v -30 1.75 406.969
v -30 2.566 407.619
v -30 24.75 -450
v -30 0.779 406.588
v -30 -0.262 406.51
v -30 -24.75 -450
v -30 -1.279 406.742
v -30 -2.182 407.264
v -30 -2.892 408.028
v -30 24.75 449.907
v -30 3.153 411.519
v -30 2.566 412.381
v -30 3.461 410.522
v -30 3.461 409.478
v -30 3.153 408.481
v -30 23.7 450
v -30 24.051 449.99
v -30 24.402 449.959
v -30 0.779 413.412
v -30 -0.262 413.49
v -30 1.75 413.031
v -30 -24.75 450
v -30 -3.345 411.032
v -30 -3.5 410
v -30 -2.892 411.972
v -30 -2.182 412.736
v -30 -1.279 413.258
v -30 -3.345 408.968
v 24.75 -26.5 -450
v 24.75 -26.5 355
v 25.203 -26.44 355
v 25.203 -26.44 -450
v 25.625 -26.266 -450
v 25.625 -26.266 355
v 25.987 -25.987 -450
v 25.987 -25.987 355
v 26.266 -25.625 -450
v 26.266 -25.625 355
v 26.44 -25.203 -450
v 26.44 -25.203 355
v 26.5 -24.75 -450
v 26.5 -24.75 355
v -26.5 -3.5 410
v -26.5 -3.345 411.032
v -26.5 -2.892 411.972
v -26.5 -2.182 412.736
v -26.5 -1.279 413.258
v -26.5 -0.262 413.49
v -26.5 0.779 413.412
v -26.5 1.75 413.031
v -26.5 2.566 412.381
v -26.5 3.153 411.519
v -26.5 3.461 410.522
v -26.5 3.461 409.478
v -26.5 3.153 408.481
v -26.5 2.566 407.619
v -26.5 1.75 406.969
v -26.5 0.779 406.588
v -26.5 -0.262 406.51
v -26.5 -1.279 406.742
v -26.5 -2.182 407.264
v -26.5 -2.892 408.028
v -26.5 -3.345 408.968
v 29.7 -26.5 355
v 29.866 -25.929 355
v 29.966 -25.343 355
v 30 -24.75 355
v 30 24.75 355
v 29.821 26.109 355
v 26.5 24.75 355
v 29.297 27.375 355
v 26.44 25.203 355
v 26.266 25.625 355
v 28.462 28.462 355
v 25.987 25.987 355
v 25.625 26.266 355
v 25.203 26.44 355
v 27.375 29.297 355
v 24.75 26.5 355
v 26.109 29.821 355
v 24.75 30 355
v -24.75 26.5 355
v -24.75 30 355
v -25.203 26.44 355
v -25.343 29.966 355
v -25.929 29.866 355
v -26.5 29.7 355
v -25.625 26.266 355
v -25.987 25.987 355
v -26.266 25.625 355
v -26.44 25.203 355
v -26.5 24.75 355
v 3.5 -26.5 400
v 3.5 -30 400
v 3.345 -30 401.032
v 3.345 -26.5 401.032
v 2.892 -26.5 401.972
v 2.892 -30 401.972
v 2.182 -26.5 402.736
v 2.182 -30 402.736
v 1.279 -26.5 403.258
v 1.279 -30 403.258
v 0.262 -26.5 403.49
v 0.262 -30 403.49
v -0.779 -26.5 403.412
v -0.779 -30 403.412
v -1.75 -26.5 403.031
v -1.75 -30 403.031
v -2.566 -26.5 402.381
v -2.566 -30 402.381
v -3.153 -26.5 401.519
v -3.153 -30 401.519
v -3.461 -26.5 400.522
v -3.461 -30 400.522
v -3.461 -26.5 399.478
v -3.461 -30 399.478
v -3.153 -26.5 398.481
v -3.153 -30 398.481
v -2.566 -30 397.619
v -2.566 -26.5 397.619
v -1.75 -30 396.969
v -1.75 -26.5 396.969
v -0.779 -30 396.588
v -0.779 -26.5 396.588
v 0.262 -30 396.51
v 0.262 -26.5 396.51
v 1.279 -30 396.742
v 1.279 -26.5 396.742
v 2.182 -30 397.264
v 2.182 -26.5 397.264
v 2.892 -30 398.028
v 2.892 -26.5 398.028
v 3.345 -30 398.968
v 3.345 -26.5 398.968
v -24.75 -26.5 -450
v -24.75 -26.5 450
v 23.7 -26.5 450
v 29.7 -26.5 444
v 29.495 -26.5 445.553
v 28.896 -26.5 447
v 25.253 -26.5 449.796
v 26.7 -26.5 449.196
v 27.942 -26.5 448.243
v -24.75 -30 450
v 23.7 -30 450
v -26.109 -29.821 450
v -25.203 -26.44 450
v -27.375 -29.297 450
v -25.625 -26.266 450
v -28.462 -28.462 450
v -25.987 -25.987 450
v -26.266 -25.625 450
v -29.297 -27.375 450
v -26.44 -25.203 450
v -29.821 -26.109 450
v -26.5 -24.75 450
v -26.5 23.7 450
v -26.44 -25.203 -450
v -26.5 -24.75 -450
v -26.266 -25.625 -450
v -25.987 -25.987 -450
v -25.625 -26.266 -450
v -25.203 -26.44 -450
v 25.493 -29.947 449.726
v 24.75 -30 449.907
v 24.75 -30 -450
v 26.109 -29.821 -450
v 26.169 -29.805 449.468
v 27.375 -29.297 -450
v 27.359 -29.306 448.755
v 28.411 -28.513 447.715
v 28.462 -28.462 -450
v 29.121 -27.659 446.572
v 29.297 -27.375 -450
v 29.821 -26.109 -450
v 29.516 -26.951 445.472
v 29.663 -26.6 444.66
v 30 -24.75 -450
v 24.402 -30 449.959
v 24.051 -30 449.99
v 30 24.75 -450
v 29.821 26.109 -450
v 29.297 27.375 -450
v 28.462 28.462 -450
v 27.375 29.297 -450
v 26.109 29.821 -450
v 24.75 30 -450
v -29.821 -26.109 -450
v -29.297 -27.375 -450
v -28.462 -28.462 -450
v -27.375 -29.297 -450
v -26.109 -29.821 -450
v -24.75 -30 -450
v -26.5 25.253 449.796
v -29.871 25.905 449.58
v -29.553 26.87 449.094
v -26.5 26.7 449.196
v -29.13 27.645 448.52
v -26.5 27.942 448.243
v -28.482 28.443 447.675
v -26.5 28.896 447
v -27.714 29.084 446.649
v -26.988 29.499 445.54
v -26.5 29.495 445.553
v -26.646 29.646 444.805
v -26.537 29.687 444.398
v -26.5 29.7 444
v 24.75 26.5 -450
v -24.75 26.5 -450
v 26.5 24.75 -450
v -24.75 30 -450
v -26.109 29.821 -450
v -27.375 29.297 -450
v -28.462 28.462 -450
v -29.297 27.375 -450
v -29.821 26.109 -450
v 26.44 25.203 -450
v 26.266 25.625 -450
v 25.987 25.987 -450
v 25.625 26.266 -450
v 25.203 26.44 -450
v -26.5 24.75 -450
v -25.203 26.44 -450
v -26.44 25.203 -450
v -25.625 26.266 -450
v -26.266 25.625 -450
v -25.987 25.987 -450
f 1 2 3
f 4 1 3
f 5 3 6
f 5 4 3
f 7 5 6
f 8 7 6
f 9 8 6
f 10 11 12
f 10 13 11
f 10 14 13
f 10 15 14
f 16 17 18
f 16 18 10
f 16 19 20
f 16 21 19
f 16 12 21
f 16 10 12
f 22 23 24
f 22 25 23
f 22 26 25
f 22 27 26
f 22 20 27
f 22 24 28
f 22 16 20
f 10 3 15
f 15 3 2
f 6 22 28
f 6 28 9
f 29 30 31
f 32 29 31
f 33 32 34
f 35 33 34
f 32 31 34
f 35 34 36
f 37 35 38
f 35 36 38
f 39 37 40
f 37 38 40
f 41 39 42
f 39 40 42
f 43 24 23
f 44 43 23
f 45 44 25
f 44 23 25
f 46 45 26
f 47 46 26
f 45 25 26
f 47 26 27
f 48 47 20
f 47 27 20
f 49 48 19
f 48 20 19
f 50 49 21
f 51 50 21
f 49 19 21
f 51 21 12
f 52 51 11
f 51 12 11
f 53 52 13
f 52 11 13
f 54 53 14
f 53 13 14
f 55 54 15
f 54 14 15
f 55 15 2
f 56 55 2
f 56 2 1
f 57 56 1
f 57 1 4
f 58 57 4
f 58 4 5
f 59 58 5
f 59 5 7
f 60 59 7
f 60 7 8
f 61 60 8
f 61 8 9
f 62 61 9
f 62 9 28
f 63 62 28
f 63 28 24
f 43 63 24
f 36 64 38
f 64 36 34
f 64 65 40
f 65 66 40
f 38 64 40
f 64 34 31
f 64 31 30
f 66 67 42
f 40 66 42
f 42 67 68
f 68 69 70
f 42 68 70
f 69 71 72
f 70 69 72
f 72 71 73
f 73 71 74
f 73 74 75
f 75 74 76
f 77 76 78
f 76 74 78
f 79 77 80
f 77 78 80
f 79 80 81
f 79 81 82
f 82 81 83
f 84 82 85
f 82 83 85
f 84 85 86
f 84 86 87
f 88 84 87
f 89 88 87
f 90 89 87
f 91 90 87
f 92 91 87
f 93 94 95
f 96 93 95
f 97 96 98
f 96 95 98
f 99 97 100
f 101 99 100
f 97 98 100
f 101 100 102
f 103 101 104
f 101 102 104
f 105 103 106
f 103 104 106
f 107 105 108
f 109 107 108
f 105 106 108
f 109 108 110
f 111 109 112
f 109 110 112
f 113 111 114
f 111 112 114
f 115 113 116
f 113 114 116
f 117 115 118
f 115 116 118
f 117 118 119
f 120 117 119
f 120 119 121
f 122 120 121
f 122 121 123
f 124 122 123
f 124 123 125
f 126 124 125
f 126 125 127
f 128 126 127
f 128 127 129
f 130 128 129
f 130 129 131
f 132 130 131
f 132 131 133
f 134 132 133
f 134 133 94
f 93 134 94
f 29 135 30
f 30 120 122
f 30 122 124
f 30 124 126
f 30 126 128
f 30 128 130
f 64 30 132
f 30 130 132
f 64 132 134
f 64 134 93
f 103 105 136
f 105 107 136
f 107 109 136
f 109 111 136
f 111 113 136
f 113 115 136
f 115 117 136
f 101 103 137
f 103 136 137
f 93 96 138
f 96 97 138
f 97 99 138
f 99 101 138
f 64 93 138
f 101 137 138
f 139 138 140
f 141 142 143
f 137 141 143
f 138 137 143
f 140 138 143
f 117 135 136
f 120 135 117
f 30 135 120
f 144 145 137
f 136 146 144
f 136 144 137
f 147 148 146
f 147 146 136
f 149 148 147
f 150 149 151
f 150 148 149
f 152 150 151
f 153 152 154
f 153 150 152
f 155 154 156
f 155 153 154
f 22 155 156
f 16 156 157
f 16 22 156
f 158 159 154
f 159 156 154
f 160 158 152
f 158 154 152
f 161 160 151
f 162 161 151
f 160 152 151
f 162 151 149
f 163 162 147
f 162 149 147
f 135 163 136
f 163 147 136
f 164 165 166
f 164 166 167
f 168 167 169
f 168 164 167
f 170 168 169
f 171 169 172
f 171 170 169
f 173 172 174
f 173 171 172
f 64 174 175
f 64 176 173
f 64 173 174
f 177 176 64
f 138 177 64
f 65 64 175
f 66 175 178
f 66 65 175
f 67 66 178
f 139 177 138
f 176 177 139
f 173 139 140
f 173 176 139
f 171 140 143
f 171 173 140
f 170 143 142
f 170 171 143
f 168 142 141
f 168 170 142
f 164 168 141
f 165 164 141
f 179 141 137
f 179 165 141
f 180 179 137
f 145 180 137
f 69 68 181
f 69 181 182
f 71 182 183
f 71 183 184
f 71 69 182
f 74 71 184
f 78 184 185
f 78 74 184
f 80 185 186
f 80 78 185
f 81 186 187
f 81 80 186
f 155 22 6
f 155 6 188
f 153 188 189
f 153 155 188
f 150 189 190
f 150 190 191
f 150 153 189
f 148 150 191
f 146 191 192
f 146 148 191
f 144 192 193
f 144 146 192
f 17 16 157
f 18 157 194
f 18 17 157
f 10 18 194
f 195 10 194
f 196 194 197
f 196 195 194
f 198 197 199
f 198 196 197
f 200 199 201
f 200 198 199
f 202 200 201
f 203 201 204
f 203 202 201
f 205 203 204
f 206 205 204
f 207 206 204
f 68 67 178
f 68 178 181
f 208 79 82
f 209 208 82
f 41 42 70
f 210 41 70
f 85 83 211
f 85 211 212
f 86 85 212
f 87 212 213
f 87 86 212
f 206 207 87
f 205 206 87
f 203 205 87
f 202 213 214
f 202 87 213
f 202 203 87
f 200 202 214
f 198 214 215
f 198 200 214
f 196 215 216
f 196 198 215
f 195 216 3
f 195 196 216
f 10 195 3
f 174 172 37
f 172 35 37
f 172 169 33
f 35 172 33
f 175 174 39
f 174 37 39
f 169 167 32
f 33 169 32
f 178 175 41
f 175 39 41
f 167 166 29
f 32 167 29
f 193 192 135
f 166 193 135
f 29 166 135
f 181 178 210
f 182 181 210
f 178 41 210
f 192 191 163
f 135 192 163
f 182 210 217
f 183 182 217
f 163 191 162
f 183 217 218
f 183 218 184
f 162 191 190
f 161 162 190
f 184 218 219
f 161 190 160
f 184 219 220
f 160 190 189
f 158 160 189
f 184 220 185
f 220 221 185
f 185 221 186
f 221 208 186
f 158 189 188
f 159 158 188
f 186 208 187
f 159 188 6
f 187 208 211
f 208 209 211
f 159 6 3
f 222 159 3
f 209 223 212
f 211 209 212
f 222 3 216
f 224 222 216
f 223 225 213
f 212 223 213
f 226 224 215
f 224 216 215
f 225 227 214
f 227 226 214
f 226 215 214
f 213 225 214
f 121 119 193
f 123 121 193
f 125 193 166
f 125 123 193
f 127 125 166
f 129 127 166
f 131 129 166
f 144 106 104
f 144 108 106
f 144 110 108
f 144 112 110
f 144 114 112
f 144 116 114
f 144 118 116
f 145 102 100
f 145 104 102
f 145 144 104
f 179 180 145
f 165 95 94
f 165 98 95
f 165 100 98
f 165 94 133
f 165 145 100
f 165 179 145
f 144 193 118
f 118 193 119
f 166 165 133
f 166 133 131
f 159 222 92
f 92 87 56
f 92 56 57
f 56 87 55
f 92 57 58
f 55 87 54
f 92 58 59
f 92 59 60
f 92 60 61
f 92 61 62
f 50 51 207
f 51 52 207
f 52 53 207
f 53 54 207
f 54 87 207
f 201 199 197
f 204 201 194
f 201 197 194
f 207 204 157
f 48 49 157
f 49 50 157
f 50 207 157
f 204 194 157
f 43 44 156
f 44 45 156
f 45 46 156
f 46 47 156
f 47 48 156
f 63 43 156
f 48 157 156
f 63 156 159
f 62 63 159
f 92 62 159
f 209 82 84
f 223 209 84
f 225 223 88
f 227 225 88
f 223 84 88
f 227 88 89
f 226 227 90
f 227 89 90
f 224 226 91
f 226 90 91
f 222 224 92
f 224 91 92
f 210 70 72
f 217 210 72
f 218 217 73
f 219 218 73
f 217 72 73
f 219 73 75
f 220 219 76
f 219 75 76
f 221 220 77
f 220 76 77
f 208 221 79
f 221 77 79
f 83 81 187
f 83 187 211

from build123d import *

# Parameters (mm, degrees)
EXTRUDE_1_DEPTH     = 450
CUT_EXTRUDE_1_DEPTH = 95
SKETCH_3_R          = 3.5
CUT_EXTRUDE_2_DEPTH = 455.972526643
SKETCH_4_R          = 3.5
CUT_EXTRUDE_3_DEPTH = 455.972526762


with BuildPart() as part:
    # Эскиз1 → Бобышка-Вытянуть1 (new, symmetric)
    with BuildSketch(Plane(origin=(0, 0, 0), x_dir=(0, 1, 0), z_dir=(0, 0, 1))):
        with BuildLine():
            Line((24.75, 30), (-24.75, 30))
            ThreePointArc((-24.75, 30), (-28.462310601, 28.462310601), (-30, 24.75))
            Line((-30, 24.75), (-30, -24.75))
            ThreePointArc((-30, -24.75), (-28.462310601, -28.462310601), (-24.75, -30))
            Line((-24.75, -30), (24.75, -30))
            ThreePointArc((24.75, -30), (28.462310601, -28.462310601), (30, -24.75))
            Line((30, -24.75), (30, 24.75))
            ThreePointArc((30, 24.75), (28.462310601, 28.462310601), (24.75, 30))
        make_face()
        with BuildLine():
            Line((-24.75, -26.5), (24.75, -26.5))
            ThreePointArc((24.75, -26.5), (25.987436867, -25.987436867), (26.5, -24.75))
            Line((26.5, -24.75), (26.5, 24.75))
            ThreePointArc((26.5, 24.75), (25.987436867, 25.987436867), (24.75, 26.5))
            Line((24.75, 26.5), (-24.75, 26.5))
            ThreePointArc((-24.75, 26.5), (-25.987436867, 25.987436867), (-26.5, 24.75))
            Line((-26.5, 24.75), (-26.5, -24.75))
            ThreePointArc((-26.5, -24.75), (-25.987436867, -25.987436867), (-24.75, -26.5))
        make_face(mode=Mode.SUBTRACT)
    extrude(amount=EXTRUDE_1_DEPTH, both=True)

    # Эскиз2 → Вырез-Вытянуть1 (cut)
    with BuildSketch(Plane.XY.offset(450)):
        Polygon((-26.5, 30), (30, 30), (30, -26.5), (-24.75, -26.5), (-26.5, -24.75), align=None)
    extrude(amount=-CUT_EXTRUDE_1_DEPTH, mode=Mode.SUBTRACT)

    # Эскиз3 → Вырез-Вытянуть2 (cut, through all)
    with BuildSketch(Plane.XZ.offset(30)):
        with Locations((0, 400)):
            Circle(SKETCH_3_R)
        with BuildLine():
            Line((23.699747468, 450), (29.699747468, 450))
            Line((29.699747468, 450), (29.699747468, 444))
            ThreePointArc((29.699747468, 444), (27.942388155, 448.242640687), (23.699747468, 450))
        make_face()
    extrude(amount=-CUT_EXTRUDE_2_DEPTH, mode=Mode.SUBTRACT)

    # Эскиз4 → Вырез-Вытянуть3 (cut, through all)
    with BuildSketch(Plane.ZY.offset(30)):
        with Locations(Location((410, 0, 0), (0, 0, 270))):
            Circle(SKETCH_4_R)
        with BuildLine():
            Line((444, 29.699747468), (450, 29.699747468))
            Line((450, 29.699747468), (450, 23.699747468))
            ThreePointArc((450, 23.699747468), (448.242640687, 27.942388155), (444, 29.699747468))
        make_face()
    extrude(amount=-CUT_EXTRUDE_3_DEPTH, mode=Mode.SUBTRACT)


solid = part.part
